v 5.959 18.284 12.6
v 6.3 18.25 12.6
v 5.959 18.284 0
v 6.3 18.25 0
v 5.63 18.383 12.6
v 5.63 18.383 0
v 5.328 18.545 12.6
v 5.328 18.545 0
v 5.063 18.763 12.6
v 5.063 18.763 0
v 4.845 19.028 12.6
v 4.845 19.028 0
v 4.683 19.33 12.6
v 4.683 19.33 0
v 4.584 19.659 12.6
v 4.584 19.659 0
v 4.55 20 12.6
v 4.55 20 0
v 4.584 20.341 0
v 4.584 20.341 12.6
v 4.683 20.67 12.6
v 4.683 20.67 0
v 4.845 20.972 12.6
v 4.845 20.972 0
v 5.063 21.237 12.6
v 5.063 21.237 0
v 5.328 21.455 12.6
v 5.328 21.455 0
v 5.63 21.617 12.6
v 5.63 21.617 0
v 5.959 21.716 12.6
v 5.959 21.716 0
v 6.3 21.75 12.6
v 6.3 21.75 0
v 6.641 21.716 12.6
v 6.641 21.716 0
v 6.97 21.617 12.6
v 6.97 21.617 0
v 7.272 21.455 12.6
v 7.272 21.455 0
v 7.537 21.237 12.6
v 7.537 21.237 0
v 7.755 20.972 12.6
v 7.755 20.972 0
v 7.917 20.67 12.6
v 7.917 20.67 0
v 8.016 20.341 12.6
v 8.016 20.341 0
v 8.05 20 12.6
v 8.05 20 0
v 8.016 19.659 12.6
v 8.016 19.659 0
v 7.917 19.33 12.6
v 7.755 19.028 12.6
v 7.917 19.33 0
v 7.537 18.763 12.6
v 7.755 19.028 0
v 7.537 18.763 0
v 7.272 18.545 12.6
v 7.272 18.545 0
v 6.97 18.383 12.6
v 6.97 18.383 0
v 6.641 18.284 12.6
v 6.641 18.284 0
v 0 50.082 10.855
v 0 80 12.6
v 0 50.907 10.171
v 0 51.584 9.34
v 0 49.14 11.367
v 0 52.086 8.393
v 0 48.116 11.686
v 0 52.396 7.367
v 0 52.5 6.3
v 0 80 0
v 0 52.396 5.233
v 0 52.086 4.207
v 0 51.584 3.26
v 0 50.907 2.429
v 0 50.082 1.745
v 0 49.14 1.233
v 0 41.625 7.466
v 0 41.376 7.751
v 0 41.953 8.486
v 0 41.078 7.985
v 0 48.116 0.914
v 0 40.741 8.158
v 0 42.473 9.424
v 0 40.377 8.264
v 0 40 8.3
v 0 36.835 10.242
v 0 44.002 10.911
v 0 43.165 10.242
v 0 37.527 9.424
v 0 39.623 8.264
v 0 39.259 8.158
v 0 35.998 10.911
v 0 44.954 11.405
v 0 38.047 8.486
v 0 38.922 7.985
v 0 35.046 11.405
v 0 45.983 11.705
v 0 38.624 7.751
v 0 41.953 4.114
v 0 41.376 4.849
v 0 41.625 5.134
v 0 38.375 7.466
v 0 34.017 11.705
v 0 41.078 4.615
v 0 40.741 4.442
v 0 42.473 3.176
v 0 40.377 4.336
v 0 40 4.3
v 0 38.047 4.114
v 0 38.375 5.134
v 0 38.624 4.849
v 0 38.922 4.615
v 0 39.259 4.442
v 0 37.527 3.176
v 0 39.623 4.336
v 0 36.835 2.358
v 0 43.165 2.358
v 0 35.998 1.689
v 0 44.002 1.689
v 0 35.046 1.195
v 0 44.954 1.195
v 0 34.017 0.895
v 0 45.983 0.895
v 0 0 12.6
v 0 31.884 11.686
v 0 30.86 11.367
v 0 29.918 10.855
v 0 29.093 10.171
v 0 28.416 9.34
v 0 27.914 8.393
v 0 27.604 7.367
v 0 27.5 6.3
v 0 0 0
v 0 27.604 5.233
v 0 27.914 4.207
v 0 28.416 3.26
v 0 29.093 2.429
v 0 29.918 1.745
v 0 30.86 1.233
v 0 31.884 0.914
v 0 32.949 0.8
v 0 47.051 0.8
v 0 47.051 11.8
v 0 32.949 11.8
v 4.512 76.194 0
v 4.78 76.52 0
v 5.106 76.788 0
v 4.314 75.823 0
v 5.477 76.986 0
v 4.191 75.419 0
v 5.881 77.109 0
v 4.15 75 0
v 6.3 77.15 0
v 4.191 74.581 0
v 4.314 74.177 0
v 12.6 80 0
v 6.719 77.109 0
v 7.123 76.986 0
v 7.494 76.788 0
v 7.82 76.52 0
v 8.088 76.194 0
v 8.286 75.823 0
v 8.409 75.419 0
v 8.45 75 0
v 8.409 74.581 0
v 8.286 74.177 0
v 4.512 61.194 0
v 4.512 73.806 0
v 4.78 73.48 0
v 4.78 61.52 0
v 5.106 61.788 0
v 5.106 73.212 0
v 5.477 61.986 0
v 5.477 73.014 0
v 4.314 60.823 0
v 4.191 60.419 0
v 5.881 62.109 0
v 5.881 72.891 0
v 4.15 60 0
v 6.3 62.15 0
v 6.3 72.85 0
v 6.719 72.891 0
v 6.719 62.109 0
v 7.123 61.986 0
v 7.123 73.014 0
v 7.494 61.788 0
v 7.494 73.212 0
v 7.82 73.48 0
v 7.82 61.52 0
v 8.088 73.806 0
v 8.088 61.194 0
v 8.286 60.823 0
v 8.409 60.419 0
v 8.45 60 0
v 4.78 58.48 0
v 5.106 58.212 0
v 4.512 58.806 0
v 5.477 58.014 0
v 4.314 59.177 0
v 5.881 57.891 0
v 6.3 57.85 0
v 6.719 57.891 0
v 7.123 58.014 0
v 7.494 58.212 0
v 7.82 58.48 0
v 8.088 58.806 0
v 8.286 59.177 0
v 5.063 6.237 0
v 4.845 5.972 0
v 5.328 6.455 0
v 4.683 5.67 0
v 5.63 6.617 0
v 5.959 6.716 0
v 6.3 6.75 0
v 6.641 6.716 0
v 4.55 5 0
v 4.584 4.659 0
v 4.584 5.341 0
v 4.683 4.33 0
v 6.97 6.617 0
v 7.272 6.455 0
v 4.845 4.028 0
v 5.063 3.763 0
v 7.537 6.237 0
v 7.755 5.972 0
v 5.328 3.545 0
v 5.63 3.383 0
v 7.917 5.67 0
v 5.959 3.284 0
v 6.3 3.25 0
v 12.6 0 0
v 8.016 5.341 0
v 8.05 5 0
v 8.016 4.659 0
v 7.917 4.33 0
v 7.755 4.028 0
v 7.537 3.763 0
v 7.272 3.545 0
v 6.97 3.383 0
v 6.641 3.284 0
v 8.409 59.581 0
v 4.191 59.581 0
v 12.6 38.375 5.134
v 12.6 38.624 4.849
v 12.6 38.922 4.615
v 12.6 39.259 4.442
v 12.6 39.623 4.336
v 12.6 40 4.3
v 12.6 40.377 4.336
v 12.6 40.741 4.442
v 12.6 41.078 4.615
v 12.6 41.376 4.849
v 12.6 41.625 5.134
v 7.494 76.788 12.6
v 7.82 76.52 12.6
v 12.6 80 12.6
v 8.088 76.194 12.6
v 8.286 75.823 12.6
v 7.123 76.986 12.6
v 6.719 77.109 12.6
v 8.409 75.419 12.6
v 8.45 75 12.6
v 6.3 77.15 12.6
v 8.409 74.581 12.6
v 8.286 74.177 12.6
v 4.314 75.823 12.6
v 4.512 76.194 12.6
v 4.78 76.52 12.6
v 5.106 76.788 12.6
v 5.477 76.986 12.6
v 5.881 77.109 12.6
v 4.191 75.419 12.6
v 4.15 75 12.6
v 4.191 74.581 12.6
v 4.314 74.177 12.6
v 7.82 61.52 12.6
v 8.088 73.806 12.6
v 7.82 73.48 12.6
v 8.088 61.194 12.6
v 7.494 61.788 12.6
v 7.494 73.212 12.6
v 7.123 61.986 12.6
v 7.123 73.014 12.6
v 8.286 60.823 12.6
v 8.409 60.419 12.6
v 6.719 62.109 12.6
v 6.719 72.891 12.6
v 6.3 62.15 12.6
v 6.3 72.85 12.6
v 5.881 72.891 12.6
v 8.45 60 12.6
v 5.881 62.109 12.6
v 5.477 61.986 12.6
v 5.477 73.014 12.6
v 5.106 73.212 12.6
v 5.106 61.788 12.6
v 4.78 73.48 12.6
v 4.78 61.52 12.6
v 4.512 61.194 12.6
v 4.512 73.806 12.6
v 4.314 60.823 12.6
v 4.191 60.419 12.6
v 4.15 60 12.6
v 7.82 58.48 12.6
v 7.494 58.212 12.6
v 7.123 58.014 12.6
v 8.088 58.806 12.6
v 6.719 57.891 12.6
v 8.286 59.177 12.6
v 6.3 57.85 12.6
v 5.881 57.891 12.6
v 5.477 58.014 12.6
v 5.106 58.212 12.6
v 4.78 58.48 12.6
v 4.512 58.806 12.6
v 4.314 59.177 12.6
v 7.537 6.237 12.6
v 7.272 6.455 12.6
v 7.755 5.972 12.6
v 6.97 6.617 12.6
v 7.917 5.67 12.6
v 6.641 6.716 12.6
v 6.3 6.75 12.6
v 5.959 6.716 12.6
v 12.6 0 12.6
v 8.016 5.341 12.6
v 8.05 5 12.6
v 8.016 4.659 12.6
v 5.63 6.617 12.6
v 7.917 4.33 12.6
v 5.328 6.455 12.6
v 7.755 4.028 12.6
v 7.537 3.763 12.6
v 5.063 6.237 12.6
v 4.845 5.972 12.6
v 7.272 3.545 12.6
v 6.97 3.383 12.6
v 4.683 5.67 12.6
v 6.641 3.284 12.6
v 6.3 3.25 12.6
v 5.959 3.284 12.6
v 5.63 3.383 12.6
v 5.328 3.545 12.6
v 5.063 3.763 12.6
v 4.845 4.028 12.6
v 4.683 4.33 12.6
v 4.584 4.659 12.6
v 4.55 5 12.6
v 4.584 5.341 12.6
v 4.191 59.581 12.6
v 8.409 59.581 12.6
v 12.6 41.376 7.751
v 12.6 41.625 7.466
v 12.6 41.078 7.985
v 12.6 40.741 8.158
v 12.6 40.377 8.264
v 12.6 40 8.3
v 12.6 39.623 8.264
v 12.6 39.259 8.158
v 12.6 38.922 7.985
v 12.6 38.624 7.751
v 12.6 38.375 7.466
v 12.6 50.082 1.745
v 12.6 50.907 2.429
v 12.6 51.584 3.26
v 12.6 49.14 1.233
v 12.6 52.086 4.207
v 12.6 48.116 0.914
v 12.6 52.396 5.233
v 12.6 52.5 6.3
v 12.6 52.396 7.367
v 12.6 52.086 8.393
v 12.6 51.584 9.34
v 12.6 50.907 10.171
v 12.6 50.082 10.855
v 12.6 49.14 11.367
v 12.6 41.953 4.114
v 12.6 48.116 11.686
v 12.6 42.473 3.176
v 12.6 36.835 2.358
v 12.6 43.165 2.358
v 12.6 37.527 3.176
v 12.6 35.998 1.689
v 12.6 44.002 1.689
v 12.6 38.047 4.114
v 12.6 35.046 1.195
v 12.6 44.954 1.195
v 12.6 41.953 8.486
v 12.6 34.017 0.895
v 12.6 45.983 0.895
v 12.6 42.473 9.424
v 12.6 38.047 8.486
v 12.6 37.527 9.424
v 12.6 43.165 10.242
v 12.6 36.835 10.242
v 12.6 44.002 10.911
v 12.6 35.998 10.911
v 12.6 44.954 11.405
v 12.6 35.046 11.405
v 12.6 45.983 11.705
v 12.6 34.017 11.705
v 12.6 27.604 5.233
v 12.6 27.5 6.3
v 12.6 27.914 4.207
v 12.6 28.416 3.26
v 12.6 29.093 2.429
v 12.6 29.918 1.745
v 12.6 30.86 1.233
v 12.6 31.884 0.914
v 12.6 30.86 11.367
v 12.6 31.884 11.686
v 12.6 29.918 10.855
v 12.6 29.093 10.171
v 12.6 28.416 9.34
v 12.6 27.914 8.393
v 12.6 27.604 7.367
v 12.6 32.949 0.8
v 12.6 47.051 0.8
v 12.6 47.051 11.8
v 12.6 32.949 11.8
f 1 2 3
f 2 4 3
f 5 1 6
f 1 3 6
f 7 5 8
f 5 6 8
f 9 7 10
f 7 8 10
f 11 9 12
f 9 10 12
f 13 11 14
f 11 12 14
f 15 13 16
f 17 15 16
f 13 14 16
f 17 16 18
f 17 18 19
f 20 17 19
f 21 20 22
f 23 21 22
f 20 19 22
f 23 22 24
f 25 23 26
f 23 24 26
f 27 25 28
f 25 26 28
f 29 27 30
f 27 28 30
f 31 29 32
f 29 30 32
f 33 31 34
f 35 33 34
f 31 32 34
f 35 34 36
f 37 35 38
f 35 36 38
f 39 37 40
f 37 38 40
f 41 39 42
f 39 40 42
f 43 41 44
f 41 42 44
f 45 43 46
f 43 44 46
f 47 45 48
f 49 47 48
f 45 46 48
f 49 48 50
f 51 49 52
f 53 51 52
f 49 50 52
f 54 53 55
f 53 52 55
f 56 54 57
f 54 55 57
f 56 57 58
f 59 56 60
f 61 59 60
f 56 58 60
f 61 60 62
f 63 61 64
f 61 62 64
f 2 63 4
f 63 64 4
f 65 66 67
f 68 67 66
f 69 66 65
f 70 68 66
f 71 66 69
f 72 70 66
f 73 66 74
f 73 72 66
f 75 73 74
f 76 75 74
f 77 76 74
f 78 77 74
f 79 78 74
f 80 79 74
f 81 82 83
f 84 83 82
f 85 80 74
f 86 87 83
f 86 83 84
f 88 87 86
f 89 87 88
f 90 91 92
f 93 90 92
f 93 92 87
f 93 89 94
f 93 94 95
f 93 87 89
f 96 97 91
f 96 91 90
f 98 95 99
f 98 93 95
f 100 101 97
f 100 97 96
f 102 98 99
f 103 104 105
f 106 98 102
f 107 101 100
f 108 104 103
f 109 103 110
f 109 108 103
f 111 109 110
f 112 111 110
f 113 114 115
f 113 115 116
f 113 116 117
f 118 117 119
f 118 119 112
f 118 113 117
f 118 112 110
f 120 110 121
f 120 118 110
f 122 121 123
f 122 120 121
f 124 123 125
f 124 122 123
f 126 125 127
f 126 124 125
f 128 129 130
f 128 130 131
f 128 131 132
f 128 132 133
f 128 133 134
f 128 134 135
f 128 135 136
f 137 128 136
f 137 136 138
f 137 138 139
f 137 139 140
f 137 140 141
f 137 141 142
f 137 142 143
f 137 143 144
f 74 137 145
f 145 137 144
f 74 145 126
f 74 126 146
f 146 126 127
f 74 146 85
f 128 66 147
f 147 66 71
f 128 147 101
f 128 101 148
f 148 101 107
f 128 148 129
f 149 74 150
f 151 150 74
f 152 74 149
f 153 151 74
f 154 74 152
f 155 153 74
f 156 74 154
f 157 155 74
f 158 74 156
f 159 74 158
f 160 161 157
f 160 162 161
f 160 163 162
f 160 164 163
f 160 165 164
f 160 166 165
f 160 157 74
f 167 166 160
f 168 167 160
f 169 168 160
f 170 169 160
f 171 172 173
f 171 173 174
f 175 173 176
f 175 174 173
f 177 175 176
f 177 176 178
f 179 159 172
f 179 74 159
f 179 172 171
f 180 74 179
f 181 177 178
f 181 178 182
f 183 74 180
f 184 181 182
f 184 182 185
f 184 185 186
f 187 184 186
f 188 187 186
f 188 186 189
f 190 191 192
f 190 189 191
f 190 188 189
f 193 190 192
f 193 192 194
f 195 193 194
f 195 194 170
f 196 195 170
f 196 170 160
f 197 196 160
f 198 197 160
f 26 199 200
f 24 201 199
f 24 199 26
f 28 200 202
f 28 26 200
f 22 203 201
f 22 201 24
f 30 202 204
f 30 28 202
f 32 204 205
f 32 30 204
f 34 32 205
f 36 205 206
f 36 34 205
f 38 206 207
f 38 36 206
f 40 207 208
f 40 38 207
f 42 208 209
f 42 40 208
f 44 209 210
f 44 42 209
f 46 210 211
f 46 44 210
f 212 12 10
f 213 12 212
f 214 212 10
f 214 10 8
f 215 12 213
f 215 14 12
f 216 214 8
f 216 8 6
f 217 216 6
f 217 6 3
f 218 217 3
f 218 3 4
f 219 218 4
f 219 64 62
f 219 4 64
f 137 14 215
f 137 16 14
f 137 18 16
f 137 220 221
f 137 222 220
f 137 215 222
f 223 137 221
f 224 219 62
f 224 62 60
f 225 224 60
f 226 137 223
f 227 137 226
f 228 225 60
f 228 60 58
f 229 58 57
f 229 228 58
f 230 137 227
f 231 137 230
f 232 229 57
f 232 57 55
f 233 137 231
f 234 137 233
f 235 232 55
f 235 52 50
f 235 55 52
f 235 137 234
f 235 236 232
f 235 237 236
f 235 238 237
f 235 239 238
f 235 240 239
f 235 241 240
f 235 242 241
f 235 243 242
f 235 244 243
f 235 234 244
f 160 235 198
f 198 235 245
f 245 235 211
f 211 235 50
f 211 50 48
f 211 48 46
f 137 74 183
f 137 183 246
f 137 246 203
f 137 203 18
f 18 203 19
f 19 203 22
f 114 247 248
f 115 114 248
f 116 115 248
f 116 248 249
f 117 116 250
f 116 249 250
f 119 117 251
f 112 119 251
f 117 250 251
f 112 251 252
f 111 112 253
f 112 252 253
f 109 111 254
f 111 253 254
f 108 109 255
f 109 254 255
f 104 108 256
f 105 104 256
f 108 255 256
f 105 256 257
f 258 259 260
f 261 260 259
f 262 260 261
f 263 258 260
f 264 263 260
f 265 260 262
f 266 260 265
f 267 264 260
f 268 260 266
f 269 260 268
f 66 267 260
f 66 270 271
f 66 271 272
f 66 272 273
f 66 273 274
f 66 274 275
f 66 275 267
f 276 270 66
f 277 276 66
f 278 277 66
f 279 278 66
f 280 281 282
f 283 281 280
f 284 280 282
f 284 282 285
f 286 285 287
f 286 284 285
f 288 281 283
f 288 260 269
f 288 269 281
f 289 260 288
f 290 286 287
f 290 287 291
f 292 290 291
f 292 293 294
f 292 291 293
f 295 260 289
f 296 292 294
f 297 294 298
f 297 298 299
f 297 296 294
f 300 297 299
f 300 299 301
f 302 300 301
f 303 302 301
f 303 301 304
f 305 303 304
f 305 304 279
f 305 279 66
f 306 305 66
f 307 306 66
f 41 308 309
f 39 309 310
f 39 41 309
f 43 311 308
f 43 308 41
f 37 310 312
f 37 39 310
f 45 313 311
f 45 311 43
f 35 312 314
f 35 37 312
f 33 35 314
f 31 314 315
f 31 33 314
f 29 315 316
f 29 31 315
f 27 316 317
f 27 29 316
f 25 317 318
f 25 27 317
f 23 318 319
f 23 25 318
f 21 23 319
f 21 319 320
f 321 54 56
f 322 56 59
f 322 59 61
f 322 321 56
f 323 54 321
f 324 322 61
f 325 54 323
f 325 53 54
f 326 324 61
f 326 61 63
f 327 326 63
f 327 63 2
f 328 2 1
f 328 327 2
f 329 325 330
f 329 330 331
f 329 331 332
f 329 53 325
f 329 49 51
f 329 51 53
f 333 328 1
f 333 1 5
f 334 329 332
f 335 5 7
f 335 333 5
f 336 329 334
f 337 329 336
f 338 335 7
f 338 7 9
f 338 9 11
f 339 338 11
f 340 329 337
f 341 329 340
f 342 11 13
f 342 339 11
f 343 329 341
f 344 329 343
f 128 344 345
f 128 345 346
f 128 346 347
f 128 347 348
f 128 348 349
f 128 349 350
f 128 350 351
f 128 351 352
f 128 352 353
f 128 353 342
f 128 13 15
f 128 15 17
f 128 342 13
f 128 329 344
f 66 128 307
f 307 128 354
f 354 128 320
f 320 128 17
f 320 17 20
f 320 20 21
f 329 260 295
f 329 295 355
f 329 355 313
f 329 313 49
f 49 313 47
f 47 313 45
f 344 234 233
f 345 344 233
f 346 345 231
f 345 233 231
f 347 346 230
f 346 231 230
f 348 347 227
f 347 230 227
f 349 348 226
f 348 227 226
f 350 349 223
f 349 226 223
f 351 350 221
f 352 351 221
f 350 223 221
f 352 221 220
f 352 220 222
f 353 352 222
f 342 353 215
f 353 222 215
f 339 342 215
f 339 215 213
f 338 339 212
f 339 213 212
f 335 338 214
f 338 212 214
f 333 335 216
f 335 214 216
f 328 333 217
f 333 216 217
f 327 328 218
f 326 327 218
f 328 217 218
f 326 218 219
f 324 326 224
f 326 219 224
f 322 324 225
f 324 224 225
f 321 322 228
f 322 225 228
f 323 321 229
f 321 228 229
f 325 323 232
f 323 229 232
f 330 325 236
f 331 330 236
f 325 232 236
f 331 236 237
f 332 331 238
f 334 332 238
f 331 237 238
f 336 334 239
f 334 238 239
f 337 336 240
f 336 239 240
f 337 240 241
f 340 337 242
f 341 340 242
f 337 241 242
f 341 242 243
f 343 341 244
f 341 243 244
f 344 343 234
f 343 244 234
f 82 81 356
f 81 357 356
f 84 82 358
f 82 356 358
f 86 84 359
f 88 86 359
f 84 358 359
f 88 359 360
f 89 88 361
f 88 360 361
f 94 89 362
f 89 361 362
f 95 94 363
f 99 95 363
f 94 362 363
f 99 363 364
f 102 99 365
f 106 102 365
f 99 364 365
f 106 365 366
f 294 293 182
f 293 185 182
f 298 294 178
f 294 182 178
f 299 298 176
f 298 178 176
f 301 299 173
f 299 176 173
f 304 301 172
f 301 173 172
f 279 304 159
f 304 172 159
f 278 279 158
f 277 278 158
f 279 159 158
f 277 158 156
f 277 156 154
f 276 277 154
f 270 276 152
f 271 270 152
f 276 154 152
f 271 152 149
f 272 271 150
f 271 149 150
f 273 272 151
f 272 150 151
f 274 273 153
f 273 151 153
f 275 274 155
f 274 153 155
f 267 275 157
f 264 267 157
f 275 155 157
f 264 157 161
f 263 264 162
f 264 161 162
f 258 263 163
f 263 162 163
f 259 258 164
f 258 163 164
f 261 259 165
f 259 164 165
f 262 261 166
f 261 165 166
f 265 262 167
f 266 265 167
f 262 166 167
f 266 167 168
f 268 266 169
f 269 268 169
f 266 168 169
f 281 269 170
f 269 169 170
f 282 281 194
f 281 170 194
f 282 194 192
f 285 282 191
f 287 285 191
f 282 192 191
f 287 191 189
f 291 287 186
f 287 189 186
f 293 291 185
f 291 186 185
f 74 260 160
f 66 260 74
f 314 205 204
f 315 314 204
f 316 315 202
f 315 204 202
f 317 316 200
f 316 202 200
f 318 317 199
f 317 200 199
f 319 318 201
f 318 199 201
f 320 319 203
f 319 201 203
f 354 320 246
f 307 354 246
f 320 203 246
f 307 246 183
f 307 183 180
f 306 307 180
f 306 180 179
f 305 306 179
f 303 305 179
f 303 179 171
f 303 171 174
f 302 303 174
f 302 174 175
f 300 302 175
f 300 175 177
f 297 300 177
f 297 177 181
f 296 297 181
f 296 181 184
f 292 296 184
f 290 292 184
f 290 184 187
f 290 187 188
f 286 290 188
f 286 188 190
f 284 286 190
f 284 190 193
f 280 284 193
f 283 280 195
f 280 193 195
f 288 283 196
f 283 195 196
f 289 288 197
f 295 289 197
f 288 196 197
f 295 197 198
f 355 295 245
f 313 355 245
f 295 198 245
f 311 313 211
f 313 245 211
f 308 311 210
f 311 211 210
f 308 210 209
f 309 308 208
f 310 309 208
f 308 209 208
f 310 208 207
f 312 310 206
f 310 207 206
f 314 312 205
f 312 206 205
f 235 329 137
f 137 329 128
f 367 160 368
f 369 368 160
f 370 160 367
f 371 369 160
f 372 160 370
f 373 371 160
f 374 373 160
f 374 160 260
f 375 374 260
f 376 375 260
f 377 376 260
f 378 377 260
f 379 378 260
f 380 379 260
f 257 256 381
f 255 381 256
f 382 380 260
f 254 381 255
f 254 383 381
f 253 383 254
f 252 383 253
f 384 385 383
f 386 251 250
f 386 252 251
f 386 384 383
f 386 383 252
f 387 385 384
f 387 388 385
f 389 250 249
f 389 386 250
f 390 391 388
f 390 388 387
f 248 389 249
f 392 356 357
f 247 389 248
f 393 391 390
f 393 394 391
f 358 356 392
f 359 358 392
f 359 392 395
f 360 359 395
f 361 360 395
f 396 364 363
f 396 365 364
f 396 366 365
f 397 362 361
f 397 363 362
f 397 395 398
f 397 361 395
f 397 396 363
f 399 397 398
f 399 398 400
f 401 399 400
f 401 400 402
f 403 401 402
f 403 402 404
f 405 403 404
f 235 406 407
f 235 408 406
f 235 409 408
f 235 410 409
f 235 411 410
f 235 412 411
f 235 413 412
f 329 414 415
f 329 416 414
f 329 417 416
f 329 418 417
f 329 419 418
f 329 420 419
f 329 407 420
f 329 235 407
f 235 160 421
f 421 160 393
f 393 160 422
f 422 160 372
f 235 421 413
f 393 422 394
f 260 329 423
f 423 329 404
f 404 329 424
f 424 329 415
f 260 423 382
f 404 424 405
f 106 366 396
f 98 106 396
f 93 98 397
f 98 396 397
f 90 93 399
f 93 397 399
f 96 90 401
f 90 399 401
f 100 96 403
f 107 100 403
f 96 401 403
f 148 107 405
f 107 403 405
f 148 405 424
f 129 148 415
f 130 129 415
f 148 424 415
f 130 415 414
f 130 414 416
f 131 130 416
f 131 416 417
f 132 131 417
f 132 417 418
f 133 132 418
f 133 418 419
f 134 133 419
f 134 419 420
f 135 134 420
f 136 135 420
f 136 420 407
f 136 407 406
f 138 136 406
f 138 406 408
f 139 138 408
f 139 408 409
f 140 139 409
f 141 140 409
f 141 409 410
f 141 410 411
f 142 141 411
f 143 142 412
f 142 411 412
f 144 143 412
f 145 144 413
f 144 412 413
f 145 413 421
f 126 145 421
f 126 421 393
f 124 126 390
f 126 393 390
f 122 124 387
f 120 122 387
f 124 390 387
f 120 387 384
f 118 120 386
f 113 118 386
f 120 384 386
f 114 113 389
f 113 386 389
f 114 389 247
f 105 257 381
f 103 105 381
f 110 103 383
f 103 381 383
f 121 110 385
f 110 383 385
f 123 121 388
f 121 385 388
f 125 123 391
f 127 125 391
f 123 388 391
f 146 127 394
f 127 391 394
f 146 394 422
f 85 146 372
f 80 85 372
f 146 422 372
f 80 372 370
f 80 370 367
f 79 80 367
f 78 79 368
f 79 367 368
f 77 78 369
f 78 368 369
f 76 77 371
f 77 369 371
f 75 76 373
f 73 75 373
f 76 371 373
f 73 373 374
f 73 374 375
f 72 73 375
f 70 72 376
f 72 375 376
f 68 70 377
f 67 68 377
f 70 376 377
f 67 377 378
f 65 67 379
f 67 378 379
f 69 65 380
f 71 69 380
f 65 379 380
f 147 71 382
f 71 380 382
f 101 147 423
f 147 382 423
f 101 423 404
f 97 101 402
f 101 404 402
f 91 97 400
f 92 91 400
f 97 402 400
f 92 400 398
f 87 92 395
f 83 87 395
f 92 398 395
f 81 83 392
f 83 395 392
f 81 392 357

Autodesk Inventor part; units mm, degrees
ref_plane "YZ Plane" through (0, 0, 0) normal (1, 0, 0) x (0, 1, 0)
ref_plane "XZ Plane" through (0, 0, 0) normal (0, 1, 0) x (-1, 0, 0)
ref_plane "XY Plane" through (0, 0, 0) normal (0, 0, 1) x (1, 0, 0)
sketch "Szkic1" plane through (0, 0, 0) normal (0, 0, 1) x (1, 0, 0)
  point P0 (0, 0)
sketch "Szkic2" plane through (0, 0, 0) normal (0, 1, 0) x (-1, 0, 0)
  line L0 (0, 0) -> (-12.6, 0)
  line L1 (-12.6, 0) -> (-12.6, 12.6)
  line L2 (-12.6, 12.6) -> (0, 12.6)
  line L3 (0, 12.6) -> (0, 0)
  dimension "d0" = 12.6
  dimension "d1" = 12.6
extrude "Wyciągnięcie proste1" add sketch "Szkic2" along normal blind 80
sketch "Szkic3" plane through (12.6, 0, 12.6) normal (1, 0, 0) x (0, 0, -1)
  line L0 (12.6, 0) -> (0, 0) projected
  line L1 (12.6, 0) -> (12.6, 80) projected
  line L2 (0, 80) -> (12.6, 80) projected
  line L3 (0, 0) -> (0, 80) projected
  arc A0 (5.1341, 38.375) -> (7.4659, 38.375) centre (6.3, 33) ccw
  arc A1 (7.4659, 41.625) -> (5.1341, 41.625) centre (6.3, 47) ccw
  arc A2 (5.1341, 41.625) -> (5.1341, 38.375) centre (6.3, 40) ccw
  arc A3 (7.4659, 38.375) -> (7.4659, 41.625) centre (6.3, 40) ccw
  dimension "d5" = 11
  dimension "d6" = 33
  dimension "d7" = 11
  dimension "d8" = 33
extrude "Wyciągnięcie proste2" cut sketch "Szkic3" against normal blind 80 contours A2 A1 A3 A0
sketch "Szkic4" plane through (0, 0, 12.6) normal (0, 0, 1) x (1, 0, 0)
  line L0 (12.6, 27.5) -> (0, 27.5) projected
  line L1 (12.6, 0) -> (0, 0) projected
  line L2 (12.6, 0) -> (12.6, 80) projected
  line L3 (0, 80) -> (12.6, 80) projected
  line L4 (0, 0) -> (0, 80) projected
  point P0 (6.3, 5)
  point P1 (6.3, 20)
  point P2 (6.3, 60)
  point P3 (6.3, 75)
  dimension "d11" = 5
  dimension "d12" = 15
  dimension "d13" = 5
  dimension "d15" = 15
hole "Otwór1" at (6.3, 5, 12.6) at (6.3, 20, 12.6) direction (0, 0, -1) diameter 3.5 end through all
hole "Otwór2" at (6.3, 60, 12.6) at (6.3, 75, 12.6) direction (0, 0, -1) diameter 4.3 end through all
properties part number "belka_tensometryczna"
